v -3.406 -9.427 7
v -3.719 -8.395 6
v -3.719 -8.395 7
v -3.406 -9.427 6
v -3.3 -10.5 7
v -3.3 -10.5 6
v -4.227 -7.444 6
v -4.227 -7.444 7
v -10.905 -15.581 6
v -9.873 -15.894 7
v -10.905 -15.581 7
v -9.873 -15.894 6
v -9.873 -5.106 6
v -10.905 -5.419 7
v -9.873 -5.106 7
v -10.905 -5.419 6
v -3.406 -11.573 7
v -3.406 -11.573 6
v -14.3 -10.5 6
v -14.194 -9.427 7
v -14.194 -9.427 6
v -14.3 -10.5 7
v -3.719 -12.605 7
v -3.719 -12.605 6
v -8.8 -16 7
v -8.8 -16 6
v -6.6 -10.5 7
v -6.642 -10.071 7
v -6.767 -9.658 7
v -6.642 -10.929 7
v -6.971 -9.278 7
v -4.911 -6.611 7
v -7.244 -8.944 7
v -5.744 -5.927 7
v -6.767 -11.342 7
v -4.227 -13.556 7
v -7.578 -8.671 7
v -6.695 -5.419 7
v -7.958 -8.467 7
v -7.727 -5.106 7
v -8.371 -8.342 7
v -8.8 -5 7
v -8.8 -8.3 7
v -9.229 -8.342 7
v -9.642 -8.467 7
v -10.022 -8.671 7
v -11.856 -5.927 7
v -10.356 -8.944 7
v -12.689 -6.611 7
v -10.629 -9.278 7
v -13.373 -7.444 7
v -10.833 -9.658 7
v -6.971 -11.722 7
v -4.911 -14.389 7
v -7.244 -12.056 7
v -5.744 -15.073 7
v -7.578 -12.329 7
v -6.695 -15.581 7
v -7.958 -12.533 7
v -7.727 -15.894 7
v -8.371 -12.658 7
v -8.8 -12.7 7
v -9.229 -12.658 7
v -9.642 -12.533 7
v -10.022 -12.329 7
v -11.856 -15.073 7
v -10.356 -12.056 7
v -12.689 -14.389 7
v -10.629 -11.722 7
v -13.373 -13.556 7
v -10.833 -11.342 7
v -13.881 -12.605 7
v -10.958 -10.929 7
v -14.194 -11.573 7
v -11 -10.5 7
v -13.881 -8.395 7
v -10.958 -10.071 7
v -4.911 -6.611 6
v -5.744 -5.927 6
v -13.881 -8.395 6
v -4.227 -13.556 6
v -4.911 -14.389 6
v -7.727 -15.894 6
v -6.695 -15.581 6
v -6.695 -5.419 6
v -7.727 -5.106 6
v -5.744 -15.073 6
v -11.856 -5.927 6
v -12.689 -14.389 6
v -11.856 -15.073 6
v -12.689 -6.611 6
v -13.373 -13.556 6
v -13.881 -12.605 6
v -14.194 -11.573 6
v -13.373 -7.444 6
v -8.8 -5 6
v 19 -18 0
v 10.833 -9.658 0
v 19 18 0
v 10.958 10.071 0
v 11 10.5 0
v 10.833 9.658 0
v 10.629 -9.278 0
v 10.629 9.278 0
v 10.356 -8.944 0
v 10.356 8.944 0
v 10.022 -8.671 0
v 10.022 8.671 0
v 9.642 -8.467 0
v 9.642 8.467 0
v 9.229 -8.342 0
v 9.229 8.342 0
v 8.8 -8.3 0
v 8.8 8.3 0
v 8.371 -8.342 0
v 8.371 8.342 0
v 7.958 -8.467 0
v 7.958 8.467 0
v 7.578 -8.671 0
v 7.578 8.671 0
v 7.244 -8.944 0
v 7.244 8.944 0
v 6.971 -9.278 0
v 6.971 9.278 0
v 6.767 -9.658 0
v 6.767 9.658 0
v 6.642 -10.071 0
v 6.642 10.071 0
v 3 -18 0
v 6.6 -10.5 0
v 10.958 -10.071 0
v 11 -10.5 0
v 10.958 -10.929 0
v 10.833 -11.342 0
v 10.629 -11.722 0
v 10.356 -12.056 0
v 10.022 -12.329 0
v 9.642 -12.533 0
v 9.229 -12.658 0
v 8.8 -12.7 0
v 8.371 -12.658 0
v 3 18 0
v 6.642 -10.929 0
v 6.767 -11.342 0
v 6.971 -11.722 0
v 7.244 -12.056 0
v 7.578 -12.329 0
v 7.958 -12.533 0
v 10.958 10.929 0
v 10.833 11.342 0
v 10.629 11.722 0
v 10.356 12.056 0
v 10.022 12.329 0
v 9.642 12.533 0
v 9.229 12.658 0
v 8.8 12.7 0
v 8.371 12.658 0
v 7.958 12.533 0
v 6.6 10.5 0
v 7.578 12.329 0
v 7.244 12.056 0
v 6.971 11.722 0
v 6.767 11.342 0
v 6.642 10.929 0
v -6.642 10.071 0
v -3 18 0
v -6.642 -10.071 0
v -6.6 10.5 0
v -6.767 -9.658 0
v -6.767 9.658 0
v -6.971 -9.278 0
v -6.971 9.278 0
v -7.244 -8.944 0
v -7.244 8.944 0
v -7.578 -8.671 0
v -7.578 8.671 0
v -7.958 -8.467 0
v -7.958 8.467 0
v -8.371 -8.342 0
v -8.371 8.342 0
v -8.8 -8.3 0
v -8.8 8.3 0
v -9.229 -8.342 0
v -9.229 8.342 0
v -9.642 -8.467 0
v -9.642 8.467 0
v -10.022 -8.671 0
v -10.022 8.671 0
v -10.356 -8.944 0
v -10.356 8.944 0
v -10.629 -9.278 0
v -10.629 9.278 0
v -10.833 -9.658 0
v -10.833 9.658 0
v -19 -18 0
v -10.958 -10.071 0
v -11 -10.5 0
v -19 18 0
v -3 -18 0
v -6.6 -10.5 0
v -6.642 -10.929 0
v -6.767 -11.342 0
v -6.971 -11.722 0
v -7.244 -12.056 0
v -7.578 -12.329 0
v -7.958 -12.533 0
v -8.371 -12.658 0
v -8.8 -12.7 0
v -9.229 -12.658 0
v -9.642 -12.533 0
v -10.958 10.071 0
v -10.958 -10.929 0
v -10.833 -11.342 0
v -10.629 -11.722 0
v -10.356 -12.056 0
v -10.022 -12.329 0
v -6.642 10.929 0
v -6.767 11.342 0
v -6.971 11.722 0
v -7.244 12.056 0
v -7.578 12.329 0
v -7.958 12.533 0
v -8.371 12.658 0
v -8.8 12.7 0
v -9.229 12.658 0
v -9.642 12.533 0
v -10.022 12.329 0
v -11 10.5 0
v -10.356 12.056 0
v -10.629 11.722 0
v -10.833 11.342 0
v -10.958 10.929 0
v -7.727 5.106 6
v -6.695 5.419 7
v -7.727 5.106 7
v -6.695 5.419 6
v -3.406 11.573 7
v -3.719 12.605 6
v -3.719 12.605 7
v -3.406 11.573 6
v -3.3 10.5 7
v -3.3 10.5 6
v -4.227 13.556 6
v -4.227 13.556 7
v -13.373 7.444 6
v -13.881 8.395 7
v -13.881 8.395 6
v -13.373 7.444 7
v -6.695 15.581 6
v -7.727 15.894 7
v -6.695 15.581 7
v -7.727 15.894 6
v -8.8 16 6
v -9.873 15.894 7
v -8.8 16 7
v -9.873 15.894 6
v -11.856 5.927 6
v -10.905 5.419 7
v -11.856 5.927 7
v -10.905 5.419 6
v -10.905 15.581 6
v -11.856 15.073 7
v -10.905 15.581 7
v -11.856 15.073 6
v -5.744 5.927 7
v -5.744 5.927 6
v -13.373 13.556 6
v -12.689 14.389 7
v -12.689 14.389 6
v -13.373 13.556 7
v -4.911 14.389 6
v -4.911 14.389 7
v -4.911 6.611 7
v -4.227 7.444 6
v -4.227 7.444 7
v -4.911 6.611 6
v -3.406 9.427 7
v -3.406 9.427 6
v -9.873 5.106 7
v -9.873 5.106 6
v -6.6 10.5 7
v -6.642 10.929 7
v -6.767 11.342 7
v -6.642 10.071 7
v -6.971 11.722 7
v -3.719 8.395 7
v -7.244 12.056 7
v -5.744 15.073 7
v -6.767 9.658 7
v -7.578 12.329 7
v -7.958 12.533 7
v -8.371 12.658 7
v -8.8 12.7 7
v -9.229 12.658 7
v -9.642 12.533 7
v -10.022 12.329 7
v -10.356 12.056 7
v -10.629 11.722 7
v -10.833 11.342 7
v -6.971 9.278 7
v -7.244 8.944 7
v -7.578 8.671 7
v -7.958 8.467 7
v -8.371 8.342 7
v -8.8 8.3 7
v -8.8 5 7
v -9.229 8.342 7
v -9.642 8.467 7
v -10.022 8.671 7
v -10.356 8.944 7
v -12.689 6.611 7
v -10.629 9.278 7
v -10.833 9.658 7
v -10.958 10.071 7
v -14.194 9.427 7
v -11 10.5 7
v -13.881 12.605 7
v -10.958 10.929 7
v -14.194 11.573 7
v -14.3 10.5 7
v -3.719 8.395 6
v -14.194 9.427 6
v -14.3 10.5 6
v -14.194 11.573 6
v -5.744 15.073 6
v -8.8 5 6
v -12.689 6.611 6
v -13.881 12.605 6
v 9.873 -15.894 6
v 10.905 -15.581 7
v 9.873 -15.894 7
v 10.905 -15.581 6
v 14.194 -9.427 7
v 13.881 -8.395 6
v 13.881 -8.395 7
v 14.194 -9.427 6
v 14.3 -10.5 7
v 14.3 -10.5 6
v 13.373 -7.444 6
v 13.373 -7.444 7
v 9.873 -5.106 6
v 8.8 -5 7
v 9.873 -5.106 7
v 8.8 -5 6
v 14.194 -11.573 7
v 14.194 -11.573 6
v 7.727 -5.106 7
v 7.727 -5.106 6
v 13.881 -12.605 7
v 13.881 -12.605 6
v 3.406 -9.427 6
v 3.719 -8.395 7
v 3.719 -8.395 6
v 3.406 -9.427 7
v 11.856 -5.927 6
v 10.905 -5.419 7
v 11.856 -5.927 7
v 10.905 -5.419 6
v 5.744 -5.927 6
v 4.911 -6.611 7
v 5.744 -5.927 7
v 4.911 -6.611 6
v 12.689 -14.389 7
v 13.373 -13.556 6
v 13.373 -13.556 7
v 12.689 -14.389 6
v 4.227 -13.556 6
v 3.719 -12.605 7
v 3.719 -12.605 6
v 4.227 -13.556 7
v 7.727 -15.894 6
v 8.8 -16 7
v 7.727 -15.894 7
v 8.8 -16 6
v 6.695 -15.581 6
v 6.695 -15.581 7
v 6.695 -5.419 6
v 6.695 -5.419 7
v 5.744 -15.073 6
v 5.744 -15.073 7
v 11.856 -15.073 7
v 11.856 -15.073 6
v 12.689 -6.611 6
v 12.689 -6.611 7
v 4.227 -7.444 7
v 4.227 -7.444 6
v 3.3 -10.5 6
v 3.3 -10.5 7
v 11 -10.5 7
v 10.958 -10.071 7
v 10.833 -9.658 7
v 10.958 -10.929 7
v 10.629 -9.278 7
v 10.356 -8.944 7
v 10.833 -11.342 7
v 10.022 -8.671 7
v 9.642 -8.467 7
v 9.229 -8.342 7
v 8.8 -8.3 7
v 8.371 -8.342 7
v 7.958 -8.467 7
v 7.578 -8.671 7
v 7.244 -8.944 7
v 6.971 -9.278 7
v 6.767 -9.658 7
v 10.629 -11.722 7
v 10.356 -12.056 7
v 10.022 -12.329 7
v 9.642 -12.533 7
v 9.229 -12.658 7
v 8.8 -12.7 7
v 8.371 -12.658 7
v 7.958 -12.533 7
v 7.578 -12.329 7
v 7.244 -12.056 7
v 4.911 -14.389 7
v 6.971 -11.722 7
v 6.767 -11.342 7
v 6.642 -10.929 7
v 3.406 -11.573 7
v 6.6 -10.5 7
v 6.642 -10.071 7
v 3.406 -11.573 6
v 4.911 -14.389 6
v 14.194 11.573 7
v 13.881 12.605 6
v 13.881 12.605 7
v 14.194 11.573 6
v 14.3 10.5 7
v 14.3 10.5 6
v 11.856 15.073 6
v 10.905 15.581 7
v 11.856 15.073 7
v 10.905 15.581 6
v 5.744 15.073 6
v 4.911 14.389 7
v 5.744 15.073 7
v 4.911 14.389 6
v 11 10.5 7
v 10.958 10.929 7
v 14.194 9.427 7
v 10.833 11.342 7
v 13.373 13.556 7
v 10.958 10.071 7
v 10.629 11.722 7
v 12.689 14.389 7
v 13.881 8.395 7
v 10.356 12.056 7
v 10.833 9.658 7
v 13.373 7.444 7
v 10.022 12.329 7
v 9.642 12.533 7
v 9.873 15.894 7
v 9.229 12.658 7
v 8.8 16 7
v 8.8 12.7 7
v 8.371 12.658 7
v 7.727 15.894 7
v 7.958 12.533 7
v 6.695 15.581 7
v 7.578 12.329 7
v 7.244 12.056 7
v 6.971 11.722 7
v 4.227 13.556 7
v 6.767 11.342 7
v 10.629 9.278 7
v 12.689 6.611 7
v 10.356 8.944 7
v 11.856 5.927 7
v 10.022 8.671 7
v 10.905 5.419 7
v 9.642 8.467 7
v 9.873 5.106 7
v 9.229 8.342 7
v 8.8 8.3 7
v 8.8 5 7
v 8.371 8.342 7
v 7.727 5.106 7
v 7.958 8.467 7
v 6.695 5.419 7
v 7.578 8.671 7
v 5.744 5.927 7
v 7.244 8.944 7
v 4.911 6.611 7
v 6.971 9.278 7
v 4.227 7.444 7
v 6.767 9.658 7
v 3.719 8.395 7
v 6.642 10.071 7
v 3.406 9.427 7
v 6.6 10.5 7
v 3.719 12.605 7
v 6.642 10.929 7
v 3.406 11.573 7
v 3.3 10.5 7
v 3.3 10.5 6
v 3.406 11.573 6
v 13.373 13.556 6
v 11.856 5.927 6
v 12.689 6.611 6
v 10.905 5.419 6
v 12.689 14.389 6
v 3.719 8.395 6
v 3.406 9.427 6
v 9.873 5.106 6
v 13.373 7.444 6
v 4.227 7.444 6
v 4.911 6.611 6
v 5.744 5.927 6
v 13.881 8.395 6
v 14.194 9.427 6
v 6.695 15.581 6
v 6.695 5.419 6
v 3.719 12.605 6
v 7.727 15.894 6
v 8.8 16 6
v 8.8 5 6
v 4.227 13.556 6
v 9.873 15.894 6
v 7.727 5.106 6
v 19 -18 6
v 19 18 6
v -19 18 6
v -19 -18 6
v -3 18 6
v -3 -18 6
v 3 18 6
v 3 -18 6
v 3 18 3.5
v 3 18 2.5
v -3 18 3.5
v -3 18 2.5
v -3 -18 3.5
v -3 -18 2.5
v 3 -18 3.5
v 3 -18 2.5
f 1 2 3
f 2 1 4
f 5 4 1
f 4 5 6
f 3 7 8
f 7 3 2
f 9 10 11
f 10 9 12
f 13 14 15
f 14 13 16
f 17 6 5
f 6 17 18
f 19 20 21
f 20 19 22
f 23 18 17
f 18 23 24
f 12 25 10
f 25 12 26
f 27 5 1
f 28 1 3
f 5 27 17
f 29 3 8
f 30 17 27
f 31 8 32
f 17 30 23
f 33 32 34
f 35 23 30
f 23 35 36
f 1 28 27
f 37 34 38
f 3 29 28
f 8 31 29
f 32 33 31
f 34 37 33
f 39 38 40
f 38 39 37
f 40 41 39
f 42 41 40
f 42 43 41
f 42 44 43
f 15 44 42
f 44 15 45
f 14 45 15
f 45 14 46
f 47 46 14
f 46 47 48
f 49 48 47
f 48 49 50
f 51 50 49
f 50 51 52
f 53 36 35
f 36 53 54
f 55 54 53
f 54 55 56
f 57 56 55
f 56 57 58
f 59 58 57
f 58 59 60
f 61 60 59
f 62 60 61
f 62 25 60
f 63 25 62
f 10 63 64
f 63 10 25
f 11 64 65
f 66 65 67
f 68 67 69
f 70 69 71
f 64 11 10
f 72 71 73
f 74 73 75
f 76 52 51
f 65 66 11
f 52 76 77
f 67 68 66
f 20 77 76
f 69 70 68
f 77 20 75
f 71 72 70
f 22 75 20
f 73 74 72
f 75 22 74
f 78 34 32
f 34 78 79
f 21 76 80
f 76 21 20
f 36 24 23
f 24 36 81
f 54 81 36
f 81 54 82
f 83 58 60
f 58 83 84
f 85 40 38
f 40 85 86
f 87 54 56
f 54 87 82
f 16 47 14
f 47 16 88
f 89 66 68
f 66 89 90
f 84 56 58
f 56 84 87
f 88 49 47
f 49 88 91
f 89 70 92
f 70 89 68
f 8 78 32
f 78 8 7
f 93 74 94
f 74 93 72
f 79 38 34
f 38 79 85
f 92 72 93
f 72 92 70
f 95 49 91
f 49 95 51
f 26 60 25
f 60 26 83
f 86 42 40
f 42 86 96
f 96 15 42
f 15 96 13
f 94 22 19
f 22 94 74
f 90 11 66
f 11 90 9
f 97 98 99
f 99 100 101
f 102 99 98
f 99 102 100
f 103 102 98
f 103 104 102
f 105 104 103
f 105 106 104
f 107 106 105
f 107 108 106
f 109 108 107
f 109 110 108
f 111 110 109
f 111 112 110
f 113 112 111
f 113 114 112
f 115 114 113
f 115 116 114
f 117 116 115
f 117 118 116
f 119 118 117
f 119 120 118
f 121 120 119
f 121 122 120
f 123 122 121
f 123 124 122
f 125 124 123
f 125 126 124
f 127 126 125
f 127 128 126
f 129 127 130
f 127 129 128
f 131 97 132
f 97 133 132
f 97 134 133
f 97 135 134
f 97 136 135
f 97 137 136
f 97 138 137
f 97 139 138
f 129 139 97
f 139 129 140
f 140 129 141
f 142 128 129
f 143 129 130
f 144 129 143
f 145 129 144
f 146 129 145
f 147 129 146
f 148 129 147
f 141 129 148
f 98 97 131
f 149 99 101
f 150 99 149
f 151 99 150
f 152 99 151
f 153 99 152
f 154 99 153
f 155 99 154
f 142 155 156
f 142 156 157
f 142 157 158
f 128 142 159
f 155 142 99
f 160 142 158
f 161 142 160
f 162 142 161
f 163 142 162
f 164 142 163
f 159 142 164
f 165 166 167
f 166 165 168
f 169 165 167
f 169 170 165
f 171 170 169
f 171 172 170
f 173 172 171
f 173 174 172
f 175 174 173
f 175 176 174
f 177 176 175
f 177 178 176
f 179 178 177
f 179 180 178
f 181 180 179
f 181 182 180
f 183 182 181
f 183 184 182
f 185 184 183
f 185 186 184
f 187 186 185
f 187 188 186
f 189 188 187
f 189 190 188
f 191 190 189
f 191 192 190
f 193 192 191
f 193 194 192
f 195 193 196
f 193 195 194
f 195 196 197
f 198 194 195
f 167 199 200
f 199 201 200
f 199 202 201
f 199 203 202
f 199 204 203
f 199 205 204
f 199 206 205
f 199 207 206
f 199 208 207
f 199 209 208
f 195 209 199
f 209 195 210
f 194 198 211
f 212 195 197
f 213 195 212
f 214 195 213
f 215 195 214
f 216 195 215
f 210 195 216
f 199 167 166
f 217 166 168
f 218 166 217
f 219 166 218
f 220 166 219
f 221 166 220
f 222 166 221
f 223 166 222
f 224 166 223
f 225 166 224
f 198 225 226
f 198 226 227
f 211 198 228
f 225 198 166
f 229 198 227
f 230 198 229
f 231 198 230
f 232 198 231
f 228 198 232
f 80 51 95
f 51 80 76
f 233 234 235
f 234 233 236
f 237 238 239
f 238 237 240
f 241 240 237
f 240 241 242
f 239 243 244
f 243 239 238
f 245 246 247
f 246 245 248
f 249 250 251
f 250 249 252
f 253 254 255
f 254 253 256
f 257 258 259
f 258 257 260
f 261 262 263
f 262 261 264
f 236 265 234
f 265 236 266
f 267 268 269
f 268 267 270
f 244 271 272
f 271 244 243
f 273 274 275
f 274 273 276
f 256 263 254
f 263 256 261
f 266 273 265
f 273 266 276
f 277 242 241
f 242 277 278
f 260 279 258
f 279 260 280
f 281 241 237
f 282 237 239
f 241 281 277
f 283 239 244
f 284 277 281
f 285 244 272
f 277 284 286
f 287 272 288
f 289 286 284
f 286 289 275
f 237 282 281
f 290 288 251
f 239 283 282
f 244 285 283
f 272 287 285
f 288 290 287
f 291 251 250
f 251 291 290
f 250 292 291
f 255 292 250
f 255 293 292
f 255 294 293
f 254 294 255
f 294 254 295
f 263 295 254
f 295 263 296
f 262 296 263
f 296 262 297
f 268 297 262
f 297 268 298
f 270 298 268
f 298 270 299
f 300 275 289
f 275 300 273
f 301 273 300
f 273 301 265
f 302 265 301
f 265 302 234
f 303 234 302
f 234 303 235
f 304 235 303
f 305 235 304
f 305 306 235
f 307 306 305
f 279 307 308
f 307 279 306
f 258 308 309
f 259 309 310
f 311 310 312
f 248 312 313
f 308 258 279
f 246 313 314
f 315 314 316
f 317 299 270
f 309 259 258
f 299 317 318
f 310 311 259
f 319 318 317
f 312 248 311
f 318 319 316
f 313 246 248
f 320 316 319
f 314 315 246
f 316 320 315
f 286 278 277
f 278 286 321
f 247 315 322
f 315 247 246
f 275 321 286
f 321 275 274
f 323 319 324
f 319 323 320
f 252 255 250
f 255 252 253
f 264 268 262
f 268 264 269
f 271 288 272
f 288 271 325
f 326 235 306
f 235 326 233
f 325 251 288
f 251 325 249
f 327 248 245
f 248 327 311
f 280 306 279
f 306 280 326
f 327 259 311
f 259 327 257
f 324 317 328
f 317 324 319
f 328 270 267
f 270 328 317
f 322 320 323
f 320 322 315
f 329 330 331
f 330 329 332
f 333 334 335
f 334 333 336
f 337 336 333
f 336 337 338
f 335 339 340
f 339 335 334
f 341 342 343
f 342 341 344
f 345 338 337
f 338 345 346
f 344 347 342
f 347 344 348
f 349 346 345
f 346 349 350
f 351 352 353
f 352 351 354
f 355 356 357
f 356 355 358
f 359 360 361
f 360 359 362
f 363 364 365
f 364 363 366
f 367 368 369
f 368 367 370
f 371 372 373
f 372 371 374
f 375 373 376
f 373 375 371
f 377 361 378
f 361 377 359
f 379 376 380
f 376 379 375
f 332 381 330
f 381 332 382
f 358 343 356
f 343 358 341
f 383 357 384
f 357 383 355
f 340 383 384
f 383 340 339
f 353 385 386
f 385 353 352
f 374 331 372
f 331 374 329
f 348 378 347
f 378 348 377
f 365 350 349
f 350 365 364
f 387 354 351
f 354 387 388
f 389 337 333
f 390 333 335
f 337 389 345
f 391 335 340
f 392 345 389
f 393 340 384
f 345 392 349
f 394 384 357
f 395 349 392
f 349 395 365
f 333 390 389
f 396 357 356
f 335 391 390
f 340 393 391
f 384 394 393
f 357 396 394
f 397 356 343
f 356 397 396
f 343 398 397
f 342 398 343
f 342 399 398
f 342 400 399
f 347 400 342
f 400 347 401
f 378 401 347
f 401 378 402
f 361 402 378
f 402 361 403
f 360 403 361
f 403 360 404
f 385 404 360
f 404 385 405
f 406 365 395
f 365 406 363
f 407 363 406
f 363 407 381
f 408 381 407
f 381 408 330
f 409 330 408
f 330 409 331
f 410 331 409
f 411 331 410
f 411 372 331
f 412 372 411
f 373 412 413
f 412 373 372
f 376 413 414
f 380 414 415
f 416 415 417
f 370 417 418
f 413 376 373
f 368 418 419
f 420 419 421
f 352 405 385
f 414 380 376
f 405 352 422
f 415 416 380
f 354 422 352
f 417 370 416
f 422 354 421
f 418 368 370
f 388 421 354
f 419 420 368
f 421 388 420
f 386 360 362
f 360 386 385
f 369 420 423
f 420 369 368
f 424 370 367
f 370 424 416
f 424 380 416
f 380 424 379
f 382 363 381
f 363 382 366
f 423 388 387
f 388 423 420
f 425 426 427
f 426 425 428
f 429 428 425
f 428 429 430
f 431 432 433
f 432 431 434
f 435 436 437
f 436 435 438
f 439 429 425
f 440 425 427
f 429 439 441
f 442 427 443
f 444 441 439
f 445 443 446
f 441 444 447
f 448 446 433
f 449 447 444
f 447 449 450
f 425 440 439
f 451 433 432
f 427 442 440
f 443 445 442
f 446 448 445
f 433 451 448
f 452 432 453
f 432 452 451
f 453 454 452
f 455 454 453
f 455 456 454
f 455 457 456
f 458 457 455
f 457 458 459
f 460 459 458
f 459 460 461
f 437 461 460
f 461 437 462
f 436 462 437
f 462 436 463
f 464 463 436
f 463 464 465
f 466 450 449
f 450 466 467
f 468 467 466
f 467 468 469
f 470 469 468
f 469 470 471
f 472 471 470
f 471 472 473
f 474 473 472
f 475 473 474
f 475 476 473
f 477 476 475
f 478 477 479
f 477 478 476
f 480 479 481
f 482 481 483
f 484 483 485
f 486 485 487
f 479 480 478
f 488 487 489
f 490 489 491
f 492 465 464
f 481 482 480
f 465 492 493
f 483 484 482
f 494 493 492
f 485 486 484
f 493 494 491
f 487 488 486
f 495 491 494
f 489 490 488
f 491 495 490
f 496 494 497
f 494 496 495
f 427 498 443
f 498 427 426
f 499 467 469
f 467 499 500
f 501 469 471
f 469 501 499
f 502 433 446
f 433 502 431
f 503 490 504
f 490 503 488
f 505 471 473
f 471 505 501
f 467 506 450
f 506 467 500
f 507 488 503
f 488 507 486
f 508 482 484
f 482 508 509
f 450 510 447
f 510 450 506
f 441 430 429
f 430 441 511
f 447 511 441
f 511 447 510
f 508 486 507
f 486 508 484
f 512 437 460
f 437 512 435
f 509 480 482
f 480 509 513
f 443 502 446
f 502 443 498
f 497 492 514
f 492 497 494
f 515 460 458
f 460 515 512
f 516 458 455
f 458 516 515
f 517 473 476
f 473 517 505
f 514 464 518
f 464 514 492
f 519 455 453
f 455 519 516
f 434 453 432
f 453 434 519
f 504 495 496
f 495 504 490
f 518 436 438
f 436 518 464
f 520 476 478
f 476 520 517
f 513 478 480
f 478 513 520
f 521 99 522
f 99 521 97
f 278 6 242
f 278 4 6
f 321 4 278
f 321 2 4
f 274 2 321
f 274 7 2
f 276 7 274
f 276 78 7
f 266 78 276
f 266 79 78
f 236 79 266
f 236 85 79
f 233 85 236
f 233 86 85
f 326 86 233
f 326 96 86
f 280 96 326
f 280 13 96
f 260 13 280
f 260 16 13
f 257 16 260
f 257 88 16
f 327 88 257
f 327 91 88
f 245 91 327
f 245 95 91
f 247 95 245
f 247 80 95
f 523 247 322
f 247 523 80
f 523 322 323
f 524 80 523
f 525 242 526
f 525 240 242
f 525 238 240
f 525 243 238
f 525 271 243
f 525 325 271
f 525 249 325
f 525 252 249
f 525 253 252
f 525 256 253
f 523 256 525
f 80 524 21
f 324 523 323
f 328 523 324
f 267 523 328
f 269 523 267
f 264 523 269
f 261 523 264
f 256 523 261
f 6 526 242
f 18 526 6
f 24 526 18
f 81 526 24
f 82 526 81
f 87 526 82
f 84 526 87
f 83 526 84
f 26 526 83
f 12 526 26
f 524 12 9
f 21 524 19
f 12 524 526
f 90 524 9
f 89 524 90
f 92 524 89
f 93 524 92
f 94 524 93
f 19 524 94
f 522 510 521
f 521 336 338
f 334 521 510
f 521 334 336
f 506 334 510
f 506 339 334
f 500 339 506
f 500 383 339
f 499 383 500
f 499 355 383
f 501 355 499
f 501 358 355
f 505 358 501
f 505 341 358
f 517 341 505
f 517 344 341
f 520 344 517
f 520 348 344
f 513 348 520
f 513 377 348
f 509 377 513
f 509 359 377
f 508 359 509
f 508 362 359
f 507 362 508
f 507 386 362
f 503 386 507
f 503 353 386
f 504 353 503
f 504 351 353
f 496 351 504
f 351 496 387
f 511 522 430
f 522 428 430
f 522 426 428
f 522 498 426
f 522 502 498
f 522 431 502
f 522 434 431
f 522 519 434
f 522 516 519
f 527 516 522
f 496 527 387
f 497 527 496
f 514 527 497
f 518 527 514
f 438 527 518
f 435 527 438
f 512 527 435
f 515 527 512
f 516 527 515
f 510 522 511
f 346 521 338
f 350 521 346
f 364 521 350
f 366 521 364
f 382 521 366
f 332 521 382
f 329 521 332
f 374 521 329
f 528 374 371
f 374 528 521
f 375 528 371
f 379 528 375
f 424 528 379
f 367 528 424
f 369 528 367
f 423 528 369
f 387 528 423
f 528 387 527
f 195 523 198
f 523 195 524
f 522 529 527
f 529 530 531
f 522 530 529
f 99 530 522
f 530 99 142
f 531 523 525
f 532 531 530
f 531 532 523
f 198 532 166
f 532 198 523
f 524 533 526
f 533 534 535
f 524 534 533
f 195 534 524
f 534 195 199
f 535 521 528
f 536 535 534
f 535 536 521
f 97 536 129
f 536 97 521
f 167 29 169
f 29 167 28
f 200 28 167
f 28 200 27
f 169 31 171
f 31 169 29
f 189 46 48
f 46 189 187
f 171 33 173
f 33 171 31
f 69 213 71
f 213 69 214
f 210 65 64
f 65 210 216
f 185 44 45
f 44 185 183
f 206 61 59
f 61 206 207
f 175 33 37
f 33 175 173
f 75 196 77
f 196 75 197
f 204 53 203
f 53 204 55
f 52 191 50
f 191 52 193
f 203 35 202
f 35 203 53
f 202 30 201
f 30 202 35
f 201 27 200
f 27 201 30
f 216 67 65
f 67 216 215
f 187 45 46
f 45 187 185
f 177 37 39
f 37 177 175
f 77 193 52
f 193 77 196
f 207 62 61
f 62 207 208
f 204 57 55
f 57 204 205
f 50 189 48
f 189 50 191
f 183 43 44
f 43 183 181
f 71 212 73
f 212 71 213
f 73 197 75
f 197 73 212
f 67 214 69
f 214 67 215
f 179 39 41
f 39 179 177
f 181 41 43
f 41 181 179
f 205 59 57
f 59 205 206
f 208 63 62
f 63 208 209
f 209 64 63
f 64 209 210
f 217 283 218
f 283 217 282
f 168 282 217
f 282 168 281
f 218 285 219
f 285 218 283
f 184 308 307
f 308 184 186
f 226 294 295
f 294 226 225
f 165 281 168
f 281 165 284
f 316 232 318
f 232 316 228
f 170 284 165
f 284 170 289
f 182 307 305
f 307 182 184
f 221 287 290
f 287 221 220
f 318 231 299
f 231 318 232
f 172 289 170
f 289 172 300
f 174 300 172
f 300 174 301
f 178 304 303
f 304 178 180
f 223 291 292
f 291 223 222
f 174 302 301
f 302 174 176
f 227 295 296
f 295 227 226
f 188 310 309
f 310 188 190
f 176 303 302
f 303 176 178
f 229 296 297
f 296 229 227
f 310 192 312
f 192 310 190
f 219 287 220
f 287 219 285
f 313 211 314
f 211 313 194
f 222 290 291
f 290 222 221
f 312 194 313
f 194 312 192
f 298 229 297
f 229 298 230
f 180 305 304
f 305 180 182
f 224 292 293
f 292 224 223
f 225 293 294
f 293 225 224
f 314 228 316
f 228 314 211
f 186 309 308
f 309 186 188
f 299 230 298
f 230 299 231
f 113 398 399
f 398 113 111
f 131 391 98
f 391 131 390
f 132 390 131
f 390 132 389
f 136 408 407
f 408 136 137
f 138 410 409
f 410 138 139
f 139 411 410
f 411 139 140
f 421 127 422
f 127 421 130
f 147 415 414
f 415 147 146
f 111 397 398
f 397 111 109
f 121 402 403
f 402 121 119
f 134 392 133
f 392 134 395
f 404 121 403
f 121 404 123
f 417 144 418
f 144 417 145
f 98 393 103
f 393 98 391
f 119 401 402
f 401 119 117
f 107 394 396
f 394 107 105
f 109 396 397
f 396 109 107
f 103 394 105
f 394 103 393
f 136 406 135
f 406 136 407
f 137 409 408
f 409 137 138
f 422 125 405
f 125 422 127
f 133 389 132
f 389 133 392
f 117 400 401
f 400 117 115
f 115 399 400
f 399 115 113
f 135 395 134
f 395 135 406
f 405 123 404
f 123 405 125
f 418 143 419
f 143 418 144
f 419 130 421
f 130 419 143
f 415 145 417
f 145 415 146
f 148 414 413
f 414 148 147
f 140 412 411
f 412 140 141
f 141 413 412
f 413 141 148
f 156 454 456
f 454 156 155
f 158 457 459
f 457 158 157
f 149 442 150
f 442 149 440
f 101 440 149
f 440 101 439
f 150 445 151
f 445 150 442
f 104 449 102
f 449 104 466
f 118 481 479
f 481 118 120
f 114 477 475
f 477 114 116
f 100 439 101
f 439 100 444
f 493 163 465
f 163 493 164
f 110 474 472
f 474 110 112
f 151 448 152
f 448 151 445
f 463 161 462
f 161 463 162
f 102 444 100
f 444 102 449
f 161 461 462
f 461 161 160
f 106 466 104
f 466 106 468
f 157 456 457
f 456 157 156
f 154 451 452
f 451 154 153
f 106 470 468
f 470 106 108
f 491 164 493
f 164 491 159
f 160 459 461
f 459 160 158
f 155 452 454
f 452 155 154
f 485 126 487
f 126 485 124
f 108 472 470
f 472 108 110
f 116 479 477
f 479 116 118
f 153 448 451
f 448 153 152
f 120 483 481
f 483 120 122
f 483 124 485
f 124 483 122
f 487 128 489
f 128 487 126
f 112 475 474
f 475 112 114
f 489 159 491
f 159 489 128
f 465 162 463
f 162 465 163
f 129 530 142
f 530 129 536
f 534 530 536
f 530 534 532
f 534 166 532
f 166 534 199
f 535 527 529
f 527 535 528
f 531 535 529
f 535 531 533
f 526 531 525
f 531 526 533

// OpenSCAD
$fn = 32;

// ----------------------------------------------------------------------
// Living hinge: 38 x 36 mm plates, 1 mm flexible web
// ----------------------------------------------------------------------

// --- parameters (mm) ---
plate_len = 16;           // plate length outside the web
plate_w = 36;             // plate width
thick = 6;                // plate thickness
web_half = 3;             // half width of the flex band
web_t = 1;                // flexible web thickness
web_z = 2.5;              // web position inside the thickness
boss_d = 11;              // screw boss diameter
boss_h = 7;               // screw boss height
boss_x = 8.8;             // screw boss distance from the web
screw_d = 4.4;            // screw hole

difference() {
  union() {
    /* one flat strip, later thinned at the middle */
    translate([-19, -18, 0]) cube([38, 36, 6]);
    /* screw bosses, sunk 0.5 mm into the plates */
    for (sx = [-8.8, 8.8]) {
      for (sy = [-10.5, 10.5]) {
        translate([sx, sy, 0]) cylinder(h = boss_h, d = boss_d);
      }
    }
  }
  /* channel from below: leaves the web on top of it */
  translate([-3, -20.5, -2.5]) cube([6, 41, 5]);
  /* channel from above: thins the web down to web_t */
  translate([-3, -20.5, 3.5]) cube([6, 41, 5]);
  /* screw holes through the bosses */
  for (sx = [-8.8, 8.8]) {
    for (sy = [-10.5, 10.5]) {
      translate([sx, sy, -2.5]) cylinder(h = boss_h + 5, d = screw_d);
    }
  }
}
